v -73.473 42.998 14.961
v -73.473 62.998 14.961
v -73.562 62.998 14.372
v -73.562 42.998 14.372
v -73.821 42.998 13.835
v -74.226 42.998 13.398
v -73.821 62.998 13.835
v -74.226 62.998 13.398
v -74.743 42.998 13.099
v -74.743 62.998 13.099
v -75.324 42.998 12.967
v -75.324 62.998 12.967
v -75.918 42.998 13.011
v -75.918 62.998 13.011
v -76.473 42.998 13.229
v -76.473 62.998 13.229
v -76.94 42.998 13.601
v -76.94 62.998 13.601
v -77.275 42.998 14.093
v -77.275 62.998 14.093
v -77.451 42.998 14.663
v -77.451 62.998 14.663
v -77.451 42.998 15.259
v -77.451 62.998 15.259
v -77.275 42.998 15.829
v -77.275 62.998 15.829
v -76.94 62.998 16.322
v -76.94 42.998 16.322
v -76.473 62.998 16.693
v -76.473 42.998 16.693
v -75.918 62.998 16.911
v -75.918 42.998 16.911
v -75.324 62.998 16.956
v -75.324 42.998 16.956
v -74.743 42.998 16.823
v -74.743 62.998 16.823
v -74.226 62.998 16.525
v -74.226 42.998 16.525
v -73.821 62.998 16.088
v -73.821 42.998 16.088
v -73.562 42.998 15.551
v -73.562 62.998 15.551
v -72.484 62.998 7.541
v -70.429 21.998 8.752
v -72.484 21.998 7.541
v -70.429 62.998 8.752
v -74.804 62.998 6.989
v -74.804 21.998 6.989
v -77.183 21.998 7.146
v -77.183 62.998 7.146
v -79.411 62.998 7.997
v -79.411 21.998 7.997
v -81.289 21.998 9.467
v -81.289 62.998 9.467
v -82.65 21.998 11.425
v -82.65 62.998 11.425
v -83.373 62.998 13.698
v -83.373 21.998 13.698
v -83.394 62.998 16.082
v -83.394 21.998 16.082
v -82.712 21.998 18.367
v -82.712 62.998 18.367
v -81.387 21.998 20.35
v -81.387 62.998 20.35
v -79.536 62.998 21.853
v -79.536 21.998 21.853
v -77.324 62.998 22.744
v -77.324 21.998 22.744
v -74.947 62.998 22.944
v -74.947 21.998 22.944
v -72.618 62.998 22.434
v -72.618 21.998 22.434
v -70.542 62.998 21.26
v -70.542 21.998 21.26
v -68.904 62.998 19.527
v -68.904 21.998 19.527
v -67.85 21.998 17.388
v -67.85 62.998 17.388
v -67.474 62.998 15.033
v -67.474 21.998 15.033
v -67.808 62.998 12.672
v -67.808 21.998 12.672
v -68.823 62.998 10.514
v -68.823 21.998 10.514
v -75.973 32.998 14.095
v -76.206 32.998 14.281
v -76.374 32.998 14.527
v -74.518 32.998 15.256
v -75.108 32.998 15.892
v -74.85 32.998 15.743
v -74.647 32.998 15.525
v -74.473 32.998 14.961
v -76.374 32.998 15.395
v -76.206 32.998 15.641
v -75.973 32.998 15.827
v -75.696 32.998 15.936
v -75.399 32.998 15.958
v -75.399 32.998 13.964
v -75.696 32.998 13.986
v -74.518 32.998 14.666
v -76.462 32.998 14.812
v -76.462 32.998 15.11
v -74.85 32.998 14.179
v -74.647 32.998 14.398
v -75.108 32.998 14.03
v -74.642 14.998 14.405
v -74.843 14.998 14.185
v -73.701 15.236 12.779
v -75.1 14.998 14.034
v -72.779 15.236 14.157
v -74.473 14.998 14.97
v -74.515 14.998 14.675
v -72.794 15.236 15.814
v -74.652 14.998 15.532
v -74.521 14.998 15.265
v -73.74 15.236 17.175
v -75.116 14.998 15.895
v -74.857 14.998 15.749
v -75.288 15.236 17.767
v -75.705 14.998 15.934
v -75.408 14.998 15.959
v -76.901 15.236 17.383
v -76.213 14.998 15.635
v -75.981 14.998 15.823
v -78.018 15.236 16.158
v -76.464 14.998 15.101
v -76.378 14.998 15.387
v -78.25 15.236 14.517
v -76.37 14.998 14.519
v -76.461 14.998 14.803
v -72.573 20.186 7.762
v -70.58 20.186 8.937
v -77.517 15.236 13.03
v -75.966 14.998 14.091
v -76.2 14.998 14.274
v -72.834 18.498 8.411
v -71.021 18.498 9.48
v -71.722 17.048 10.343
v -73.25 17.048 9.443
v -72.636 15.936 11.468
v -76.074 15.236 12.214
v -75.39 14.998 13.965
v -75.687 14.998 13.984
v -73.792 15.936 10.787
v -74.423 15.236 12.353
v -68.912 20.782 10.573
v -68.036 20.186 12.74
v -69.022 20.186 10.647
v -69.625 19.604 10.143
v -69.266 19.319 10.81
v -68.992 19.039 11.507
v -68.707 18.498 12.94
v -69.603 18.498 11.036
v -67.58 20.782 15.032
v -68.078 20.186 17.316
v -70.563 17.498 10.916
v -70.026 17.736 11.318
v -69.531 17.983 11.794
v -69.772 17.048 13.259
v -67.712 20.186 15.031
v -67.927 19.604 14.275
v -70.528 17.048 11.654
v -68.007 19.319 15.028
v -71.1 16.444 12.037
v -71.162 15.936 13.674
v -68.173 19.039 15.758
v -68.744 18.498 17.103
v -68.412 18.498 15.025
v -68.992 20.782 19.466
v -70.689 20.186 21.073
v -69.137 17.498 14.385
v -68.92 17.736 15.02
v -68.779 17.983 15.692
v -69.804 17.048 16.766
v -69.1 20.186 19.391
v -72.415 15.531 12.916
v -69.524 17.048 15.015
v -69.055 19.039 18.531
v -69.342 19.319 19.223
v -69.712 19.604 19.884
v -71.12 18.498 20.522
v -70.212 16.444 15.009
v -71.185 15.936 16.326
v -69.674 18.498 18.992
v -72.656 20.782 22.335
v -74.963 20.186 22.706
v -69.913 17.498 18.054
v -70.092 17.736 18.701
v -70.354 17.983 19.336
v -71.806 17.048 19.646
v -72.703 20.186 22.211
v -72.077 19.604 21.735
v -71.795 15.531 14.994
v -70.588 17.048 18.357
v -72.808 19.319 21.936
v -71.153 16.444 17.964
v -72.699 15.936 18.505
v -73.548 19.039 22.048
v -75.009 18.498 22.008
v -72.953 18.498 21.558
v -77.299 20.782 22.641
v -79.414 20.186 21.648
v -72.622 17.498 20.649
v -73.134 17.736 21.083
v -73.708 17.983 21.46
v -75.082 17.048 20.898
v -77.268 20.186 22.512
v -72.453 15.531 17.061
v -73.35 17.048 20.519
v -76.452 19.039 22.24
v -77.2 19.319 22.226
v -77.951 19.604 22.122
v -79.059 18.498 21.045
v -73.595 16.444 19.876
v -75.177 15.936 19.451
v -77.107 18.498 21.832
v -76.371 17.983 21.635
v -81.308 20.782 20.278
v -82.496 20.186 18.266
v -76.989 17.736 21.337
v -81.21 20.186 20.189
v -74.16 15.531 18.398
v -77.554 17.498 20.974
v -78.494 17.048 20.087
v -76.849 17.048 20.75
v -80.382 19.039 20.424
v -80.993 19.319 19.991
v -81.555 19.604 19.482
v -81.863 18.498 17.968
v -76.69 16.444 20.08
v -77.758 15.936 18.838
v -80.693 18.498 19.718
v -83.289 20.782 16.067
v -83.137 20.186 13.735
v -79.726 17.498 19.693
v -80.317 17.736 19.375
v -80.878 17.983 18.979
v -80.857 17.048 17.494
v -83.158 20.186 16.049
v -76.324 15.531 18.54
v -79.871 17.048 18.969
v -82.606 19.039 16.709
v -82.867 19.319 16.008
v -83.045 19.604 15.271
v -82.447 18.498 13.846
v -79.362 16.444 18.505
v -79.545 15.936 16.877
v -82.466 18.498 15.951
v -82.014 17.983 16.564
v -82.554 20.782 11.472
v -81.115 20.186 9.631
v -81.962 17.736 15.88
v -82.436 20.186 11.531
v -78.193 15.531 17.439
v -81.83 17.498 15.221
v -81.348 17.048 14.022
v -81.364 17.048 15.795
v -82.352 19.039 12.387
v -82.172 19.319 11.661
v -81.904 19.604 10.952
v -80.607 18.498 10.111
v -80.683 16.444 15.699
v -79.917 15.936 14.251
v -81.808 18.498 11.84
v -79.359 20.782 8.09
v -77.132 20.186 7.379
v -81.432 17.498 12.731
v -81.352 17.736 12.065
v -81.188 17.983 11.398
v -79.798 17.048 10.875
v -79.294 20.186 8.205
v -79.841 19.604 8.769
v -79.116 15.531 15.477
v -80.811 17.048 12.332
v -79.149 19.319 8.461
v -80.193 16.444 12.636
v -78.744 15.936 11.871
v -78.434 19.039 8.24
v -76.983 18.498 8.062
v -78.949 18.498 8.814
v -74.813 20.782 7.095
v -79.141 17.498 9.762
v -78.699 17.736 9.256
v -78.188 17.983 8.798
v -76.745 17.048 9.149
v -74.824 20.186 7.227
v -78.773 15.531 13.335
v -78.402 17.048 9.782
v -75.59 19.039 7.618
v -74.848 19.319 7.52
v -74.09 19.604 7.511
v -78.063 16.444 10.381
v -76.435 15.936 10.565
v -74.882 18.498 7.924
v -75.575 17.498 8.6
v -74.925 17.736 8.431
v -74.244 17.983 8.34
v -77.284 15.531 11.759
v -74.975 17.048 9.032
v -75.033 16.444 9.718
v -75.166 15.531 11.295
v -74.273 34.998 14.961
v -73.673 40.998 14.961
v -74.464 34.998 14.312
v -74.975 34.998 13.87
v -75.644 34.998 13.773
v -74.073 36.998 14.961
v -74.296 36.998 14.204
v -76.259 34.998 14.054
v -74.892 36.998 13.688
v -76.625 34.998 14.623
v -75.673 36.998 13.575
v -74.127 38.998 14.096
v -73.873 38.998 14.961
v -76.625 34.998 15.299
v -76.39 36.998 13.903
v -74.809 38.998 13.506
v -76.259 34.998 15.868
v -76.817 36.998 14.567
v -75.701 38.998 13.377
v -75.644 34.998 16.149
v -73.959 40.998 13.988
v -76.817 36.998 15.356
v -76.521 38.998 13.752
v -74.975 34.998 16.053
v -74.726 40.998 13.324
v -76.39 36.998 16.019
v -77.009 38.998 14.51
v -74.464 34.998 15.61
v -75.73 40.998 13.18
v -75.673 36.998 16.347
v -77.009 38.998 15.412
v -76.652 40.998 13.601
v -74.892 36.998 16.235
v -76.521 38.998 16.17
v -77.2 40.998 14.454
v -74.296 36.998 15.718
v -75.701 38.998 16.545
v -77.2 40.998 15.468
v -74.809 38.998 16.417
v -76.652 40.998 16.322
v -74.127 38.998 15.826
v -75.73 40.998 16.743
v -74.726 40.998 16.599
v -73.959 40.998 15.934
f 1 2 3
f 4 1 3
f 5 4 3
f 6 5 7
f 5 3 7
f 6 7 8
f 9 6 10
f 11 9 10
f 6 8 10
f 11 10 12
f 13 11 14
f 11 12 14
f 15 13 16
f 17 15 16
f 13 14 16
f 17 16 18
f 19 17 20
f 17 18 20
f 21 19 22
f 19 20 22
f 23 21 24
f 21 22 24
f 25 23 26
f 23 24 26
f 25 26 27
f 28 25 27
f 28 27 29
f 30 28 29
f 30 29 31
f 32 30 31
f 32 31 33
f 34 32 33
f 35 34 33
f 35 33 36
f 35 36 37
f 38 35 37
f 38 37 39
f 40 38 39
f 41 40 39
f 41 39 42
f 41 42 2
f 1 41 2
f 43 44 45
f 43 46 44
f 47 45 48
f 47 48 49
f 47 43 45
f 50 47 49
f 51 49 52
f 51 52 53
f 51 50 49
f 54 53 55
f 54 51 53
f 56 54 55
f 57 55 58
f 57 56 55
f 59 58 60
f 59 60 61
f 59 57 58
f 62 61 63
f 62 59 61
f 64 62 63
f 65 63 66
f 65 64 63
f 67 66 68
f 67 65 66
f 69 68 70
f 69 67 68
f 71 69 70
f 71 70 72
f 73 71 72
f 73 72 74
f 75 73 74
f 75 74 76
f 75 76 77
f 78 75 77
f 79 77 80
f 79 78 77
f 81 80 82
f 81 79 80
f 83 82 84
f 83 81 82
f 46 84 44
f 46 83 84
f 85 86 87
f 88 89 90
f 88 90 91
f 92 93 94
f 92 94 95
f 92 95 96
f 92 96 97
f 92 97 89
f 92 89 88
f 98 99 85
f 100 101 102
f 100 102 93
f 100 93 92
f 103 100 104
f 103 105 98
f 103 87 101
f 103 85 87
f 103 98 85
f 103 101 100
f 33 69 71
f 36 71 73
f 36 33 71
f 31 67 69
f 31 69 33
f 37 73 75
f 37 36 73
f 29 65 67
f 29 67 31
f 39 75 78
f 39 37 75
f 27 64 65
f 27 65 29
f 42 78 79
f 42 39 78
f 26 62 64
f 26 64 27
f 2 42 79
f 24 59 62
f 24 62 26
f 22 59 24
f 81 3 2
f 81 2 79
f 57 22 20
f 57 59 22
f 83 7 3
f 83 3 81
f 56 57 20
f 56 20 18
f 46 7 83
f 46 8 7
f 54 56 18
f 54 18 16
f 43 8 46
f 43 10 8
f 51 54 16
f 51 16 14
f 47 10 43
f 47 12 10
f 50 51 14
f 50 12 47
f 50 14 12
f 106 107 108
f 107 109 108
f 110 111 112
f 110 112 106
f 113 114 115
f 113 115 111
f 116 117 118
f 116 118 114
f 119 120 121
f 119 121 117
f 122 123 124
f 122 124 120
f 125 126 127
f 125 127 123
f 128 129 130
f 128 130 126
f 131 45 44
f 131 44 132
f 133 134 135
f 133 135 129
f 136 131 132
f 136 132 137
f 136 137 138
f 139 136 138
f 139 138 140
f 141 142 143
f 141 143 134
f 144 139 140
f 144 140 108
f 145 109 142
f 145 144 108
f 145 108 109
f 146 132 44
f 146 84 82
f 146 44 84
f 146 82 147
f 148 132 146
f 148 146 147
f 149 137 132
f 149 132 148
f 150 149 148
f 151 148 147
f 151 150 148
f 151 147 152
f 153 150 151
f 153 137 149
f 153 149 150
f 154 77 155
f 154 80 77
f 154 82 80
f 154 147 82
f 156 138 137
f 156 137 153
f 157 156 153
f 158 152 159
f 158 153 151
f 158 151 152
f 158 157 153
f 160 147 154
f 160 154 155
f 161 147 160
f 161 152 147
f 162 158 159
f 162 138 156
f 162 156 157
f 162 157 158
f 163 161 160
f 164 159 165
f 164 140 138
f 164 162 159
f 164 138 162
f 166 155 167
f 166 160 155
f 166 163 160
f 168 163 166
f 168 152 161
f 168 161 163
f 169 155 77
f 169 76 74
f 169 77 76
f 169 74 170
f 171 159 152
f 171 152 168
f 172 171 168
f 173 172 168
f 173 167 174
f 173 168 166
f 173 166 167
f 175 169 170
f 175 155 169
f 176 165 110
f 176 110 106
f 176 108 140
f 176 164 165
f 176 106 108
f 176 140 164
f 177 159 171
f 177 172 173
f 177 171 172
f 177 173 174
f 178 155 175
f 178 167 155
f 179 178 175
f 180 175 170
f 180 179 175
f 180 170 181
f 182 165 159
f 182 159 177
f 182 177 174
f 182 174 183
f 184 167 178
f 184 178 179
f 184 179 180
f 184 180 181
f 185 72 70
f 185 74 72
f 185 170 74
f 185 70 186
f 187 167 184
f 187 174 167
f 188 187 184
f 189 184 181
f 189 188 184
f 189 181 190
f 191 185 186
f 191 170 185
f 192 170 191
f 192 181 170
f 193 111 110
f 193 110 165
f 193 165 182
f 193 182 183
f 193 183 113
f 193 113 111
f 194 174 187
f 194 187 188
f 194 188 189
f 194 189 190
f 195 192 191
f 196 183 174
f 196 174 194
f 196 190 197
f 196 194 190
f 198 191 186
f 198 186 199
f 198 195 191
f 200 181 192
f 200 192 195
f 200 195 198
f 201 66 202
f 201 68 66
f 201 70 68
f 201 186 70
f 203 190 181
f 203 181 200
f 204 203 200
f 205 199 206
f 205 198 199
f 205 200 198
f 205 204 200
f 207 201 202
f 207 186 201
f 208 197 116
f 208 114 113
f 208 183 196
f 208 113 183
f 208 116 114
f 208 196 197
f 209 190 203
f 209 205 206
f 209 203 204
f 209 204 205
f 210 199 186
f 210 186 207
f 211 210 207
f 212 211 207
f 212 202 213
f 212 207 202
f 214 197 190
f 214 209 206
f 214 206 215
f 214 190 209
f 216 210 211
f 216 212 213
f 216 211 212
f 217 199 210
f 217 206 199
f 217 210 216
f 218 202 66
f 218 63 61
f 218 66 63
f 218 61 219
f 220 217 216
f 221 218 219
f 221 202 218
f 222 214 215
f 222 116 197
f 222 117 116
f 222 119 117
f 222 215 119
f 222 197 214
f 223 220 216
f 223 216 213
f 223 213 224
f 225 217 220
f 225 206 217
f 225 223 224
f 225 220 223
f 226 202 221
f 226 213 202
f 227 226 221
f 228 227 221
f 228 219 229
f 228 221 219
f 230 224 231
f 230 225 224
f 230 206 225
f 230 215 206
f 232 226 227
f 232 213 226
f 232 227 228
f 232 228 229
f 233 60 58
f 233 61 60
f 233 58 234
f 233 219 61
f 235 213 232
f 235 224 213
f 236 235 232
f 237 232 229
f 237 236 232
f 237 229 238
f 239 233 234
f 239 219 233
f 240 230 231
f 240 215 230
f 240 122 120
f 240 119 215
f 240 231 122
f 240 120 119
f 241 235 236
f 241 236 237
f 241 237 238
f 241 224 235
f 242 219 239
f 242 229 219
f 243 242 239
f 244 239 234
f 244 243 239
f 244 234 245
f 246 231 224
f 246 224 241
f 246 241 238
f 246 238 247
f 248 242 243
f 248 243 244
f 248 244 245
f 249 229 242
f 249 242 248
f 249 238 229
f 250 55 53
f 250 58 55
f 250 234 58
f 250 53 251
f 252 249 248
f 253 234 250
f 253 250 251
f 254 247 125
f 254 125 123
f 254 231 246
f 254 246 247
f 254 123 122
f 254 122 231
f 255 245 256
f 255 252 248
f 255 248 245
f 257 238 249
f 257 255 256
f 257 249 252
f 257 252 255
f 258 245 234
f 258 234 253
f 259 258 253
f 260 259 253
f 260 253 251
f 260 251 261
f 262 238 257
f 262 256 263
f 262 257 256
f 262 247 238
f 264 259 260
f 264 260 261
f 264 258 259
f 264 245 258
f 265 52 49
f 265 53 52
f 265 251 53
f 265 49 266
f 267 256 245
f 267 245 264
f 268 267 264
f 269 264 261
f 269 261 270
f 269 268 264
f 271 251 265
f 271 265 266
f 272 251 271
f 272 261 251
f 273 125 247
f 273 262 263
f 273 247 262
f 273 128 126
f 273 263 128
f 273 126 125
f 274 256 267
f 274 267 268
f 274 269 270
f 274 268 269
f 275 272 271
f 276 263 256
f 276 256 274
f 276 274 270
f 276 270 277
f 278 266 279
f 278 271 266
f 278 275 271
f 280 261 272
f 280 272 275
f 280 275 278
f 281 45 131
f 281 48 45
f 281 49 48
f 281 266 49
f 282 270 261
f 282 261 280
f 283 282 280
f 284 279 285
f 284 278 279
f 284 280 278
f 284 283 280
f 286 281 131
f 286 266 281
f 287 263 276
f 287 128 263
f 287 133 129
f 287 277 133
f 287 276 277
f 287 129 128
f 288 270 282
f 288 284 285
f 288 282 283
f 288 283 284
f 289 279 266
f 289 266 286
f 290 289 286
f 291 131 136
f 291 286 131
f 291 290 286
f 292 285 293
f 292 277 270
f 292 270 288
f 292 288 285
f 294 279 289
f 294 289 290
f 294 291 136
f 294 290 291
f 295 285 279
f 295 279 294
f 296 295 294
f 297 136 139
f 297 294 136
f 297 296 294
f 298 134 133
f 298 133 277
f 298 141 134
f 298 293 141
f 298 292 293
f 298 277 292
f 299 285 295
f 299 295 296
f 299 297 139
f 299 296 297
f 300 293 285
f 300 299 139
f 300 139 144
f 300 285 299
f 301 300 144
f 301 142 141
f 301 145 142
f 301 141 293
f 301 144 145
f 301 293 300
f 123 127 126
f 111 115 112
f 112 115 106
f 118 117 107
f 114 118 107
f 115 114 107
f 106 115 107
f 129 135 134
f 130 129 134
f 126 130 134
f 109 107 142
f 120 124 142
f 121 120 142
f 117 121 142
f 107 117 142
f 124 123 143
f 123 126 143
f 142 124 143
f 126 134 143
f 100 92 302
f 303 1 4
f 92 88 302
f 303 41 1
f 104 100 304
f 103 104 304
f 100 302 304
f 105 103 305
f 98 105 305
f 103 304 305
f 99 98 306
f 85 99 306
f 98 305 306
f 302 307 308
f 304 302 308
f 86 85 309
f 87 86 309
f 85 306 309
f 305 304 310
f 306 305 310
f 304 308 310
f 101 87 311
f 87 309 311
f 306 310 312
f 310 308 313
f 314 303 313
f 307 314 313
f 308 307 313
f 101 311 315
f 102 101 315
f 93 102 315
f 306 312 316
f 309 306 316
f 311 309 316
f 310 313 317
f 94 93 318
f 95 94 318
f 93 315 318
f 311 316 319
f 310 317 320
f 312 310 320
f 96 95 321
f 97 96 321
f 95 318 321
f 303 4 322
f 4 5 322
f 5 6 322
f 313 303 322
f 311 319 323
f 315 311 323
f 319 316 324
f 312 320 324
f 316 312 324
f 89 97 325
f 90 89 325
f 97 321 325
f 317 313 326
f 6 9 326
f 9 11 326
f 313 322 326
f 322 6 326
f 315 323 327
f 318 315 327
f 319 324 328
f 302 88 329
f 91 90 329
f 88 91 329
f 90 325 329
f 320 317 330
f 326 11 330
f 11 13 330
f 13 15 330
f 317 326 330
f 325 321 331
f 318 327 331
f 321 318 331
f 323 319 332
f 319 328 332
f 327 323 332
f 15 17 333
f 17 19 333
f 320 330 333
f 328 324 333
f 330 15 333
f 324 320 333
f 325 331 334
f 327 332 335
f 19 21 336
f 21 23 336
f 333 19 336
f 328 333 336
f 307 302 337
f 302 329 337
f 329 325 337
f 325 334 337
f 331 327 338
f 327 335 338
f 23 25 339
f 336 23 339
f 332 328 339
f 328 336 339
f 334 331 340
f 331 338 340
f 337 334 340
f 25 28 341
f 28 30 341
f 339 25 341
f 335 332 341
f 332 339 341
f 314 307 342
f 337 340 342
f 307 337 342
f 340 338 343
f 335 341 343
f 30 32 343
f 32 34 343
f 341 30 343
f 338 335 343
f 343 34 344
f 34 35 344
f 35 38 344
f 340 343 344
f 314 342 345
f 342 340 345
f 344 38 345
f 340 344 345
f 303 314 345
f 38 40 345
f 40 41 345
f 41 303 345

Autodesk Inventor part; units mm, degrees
ref_plane "YZ Plane" through (0, 0, 0) normal (1, 0, 0) x (0, 1, 0)
ref_plane "XZ Plane" through (0, 0, 0) normal (0, 1, 0) x (-1, 0, 0)
ref_plane "XY Plane" through (0, 0, 0) normal (0, 0, 1) x (1, 0, 0)
ref_plane "Płaszczyzna konstrukcyjna1" through (-75.4734, 102.9977, 14.9612) normal (0, 1, 0) x (0.6305, 0, -0.7762)
ref_plane "Płaszczyzna konstrukcyjna2" through (-75.4734, 62.9977, 14.9612) normal (0, 1, 0) x (0.6305, 0, -0.7762)
sketch "Szkic1" plane through (-75.4734, 62.9977, 14.9612) normal (0, 1, 0) x (0.6305, 0, -0.7762)
  circle A0 centre (0, 0) radius 8
  point P0 (59.1962, -49.1515)
  dimension "d0" = 16
extrude "Wyciągnięcie proste1" add sketch "Szkic1" against normal blind 48
fillet "Zaokrąglenie1" radius 7 1 edges at (-80.5171, 14.9977, 21.1709)
sketch "Szkic2" plane through (-75.4734, 62.9977, 14.9612) normal (0, 1, 0) x (1, 0, 0)
  circle A0 centre (0, 0) radius 8 projected
  circle A1 centre (0, 0) radius 1 projected
  circle A2 centre (0, 0) radius 2 projected
  point P0 (75.4734, 14.9612)
extrude "Wyciągnięcie proste2" cut sketch "Szkic2" against normal blind 30 contours A1 | A2
chamfer "Faza1" distance 10 distance2 1 1 edges at (-77.4734, 32.9977, 14.9612) measured on face at (-75.5539, 52.9977, 16.9596)
properties part number "ciecznnieznana" material "Woda"
